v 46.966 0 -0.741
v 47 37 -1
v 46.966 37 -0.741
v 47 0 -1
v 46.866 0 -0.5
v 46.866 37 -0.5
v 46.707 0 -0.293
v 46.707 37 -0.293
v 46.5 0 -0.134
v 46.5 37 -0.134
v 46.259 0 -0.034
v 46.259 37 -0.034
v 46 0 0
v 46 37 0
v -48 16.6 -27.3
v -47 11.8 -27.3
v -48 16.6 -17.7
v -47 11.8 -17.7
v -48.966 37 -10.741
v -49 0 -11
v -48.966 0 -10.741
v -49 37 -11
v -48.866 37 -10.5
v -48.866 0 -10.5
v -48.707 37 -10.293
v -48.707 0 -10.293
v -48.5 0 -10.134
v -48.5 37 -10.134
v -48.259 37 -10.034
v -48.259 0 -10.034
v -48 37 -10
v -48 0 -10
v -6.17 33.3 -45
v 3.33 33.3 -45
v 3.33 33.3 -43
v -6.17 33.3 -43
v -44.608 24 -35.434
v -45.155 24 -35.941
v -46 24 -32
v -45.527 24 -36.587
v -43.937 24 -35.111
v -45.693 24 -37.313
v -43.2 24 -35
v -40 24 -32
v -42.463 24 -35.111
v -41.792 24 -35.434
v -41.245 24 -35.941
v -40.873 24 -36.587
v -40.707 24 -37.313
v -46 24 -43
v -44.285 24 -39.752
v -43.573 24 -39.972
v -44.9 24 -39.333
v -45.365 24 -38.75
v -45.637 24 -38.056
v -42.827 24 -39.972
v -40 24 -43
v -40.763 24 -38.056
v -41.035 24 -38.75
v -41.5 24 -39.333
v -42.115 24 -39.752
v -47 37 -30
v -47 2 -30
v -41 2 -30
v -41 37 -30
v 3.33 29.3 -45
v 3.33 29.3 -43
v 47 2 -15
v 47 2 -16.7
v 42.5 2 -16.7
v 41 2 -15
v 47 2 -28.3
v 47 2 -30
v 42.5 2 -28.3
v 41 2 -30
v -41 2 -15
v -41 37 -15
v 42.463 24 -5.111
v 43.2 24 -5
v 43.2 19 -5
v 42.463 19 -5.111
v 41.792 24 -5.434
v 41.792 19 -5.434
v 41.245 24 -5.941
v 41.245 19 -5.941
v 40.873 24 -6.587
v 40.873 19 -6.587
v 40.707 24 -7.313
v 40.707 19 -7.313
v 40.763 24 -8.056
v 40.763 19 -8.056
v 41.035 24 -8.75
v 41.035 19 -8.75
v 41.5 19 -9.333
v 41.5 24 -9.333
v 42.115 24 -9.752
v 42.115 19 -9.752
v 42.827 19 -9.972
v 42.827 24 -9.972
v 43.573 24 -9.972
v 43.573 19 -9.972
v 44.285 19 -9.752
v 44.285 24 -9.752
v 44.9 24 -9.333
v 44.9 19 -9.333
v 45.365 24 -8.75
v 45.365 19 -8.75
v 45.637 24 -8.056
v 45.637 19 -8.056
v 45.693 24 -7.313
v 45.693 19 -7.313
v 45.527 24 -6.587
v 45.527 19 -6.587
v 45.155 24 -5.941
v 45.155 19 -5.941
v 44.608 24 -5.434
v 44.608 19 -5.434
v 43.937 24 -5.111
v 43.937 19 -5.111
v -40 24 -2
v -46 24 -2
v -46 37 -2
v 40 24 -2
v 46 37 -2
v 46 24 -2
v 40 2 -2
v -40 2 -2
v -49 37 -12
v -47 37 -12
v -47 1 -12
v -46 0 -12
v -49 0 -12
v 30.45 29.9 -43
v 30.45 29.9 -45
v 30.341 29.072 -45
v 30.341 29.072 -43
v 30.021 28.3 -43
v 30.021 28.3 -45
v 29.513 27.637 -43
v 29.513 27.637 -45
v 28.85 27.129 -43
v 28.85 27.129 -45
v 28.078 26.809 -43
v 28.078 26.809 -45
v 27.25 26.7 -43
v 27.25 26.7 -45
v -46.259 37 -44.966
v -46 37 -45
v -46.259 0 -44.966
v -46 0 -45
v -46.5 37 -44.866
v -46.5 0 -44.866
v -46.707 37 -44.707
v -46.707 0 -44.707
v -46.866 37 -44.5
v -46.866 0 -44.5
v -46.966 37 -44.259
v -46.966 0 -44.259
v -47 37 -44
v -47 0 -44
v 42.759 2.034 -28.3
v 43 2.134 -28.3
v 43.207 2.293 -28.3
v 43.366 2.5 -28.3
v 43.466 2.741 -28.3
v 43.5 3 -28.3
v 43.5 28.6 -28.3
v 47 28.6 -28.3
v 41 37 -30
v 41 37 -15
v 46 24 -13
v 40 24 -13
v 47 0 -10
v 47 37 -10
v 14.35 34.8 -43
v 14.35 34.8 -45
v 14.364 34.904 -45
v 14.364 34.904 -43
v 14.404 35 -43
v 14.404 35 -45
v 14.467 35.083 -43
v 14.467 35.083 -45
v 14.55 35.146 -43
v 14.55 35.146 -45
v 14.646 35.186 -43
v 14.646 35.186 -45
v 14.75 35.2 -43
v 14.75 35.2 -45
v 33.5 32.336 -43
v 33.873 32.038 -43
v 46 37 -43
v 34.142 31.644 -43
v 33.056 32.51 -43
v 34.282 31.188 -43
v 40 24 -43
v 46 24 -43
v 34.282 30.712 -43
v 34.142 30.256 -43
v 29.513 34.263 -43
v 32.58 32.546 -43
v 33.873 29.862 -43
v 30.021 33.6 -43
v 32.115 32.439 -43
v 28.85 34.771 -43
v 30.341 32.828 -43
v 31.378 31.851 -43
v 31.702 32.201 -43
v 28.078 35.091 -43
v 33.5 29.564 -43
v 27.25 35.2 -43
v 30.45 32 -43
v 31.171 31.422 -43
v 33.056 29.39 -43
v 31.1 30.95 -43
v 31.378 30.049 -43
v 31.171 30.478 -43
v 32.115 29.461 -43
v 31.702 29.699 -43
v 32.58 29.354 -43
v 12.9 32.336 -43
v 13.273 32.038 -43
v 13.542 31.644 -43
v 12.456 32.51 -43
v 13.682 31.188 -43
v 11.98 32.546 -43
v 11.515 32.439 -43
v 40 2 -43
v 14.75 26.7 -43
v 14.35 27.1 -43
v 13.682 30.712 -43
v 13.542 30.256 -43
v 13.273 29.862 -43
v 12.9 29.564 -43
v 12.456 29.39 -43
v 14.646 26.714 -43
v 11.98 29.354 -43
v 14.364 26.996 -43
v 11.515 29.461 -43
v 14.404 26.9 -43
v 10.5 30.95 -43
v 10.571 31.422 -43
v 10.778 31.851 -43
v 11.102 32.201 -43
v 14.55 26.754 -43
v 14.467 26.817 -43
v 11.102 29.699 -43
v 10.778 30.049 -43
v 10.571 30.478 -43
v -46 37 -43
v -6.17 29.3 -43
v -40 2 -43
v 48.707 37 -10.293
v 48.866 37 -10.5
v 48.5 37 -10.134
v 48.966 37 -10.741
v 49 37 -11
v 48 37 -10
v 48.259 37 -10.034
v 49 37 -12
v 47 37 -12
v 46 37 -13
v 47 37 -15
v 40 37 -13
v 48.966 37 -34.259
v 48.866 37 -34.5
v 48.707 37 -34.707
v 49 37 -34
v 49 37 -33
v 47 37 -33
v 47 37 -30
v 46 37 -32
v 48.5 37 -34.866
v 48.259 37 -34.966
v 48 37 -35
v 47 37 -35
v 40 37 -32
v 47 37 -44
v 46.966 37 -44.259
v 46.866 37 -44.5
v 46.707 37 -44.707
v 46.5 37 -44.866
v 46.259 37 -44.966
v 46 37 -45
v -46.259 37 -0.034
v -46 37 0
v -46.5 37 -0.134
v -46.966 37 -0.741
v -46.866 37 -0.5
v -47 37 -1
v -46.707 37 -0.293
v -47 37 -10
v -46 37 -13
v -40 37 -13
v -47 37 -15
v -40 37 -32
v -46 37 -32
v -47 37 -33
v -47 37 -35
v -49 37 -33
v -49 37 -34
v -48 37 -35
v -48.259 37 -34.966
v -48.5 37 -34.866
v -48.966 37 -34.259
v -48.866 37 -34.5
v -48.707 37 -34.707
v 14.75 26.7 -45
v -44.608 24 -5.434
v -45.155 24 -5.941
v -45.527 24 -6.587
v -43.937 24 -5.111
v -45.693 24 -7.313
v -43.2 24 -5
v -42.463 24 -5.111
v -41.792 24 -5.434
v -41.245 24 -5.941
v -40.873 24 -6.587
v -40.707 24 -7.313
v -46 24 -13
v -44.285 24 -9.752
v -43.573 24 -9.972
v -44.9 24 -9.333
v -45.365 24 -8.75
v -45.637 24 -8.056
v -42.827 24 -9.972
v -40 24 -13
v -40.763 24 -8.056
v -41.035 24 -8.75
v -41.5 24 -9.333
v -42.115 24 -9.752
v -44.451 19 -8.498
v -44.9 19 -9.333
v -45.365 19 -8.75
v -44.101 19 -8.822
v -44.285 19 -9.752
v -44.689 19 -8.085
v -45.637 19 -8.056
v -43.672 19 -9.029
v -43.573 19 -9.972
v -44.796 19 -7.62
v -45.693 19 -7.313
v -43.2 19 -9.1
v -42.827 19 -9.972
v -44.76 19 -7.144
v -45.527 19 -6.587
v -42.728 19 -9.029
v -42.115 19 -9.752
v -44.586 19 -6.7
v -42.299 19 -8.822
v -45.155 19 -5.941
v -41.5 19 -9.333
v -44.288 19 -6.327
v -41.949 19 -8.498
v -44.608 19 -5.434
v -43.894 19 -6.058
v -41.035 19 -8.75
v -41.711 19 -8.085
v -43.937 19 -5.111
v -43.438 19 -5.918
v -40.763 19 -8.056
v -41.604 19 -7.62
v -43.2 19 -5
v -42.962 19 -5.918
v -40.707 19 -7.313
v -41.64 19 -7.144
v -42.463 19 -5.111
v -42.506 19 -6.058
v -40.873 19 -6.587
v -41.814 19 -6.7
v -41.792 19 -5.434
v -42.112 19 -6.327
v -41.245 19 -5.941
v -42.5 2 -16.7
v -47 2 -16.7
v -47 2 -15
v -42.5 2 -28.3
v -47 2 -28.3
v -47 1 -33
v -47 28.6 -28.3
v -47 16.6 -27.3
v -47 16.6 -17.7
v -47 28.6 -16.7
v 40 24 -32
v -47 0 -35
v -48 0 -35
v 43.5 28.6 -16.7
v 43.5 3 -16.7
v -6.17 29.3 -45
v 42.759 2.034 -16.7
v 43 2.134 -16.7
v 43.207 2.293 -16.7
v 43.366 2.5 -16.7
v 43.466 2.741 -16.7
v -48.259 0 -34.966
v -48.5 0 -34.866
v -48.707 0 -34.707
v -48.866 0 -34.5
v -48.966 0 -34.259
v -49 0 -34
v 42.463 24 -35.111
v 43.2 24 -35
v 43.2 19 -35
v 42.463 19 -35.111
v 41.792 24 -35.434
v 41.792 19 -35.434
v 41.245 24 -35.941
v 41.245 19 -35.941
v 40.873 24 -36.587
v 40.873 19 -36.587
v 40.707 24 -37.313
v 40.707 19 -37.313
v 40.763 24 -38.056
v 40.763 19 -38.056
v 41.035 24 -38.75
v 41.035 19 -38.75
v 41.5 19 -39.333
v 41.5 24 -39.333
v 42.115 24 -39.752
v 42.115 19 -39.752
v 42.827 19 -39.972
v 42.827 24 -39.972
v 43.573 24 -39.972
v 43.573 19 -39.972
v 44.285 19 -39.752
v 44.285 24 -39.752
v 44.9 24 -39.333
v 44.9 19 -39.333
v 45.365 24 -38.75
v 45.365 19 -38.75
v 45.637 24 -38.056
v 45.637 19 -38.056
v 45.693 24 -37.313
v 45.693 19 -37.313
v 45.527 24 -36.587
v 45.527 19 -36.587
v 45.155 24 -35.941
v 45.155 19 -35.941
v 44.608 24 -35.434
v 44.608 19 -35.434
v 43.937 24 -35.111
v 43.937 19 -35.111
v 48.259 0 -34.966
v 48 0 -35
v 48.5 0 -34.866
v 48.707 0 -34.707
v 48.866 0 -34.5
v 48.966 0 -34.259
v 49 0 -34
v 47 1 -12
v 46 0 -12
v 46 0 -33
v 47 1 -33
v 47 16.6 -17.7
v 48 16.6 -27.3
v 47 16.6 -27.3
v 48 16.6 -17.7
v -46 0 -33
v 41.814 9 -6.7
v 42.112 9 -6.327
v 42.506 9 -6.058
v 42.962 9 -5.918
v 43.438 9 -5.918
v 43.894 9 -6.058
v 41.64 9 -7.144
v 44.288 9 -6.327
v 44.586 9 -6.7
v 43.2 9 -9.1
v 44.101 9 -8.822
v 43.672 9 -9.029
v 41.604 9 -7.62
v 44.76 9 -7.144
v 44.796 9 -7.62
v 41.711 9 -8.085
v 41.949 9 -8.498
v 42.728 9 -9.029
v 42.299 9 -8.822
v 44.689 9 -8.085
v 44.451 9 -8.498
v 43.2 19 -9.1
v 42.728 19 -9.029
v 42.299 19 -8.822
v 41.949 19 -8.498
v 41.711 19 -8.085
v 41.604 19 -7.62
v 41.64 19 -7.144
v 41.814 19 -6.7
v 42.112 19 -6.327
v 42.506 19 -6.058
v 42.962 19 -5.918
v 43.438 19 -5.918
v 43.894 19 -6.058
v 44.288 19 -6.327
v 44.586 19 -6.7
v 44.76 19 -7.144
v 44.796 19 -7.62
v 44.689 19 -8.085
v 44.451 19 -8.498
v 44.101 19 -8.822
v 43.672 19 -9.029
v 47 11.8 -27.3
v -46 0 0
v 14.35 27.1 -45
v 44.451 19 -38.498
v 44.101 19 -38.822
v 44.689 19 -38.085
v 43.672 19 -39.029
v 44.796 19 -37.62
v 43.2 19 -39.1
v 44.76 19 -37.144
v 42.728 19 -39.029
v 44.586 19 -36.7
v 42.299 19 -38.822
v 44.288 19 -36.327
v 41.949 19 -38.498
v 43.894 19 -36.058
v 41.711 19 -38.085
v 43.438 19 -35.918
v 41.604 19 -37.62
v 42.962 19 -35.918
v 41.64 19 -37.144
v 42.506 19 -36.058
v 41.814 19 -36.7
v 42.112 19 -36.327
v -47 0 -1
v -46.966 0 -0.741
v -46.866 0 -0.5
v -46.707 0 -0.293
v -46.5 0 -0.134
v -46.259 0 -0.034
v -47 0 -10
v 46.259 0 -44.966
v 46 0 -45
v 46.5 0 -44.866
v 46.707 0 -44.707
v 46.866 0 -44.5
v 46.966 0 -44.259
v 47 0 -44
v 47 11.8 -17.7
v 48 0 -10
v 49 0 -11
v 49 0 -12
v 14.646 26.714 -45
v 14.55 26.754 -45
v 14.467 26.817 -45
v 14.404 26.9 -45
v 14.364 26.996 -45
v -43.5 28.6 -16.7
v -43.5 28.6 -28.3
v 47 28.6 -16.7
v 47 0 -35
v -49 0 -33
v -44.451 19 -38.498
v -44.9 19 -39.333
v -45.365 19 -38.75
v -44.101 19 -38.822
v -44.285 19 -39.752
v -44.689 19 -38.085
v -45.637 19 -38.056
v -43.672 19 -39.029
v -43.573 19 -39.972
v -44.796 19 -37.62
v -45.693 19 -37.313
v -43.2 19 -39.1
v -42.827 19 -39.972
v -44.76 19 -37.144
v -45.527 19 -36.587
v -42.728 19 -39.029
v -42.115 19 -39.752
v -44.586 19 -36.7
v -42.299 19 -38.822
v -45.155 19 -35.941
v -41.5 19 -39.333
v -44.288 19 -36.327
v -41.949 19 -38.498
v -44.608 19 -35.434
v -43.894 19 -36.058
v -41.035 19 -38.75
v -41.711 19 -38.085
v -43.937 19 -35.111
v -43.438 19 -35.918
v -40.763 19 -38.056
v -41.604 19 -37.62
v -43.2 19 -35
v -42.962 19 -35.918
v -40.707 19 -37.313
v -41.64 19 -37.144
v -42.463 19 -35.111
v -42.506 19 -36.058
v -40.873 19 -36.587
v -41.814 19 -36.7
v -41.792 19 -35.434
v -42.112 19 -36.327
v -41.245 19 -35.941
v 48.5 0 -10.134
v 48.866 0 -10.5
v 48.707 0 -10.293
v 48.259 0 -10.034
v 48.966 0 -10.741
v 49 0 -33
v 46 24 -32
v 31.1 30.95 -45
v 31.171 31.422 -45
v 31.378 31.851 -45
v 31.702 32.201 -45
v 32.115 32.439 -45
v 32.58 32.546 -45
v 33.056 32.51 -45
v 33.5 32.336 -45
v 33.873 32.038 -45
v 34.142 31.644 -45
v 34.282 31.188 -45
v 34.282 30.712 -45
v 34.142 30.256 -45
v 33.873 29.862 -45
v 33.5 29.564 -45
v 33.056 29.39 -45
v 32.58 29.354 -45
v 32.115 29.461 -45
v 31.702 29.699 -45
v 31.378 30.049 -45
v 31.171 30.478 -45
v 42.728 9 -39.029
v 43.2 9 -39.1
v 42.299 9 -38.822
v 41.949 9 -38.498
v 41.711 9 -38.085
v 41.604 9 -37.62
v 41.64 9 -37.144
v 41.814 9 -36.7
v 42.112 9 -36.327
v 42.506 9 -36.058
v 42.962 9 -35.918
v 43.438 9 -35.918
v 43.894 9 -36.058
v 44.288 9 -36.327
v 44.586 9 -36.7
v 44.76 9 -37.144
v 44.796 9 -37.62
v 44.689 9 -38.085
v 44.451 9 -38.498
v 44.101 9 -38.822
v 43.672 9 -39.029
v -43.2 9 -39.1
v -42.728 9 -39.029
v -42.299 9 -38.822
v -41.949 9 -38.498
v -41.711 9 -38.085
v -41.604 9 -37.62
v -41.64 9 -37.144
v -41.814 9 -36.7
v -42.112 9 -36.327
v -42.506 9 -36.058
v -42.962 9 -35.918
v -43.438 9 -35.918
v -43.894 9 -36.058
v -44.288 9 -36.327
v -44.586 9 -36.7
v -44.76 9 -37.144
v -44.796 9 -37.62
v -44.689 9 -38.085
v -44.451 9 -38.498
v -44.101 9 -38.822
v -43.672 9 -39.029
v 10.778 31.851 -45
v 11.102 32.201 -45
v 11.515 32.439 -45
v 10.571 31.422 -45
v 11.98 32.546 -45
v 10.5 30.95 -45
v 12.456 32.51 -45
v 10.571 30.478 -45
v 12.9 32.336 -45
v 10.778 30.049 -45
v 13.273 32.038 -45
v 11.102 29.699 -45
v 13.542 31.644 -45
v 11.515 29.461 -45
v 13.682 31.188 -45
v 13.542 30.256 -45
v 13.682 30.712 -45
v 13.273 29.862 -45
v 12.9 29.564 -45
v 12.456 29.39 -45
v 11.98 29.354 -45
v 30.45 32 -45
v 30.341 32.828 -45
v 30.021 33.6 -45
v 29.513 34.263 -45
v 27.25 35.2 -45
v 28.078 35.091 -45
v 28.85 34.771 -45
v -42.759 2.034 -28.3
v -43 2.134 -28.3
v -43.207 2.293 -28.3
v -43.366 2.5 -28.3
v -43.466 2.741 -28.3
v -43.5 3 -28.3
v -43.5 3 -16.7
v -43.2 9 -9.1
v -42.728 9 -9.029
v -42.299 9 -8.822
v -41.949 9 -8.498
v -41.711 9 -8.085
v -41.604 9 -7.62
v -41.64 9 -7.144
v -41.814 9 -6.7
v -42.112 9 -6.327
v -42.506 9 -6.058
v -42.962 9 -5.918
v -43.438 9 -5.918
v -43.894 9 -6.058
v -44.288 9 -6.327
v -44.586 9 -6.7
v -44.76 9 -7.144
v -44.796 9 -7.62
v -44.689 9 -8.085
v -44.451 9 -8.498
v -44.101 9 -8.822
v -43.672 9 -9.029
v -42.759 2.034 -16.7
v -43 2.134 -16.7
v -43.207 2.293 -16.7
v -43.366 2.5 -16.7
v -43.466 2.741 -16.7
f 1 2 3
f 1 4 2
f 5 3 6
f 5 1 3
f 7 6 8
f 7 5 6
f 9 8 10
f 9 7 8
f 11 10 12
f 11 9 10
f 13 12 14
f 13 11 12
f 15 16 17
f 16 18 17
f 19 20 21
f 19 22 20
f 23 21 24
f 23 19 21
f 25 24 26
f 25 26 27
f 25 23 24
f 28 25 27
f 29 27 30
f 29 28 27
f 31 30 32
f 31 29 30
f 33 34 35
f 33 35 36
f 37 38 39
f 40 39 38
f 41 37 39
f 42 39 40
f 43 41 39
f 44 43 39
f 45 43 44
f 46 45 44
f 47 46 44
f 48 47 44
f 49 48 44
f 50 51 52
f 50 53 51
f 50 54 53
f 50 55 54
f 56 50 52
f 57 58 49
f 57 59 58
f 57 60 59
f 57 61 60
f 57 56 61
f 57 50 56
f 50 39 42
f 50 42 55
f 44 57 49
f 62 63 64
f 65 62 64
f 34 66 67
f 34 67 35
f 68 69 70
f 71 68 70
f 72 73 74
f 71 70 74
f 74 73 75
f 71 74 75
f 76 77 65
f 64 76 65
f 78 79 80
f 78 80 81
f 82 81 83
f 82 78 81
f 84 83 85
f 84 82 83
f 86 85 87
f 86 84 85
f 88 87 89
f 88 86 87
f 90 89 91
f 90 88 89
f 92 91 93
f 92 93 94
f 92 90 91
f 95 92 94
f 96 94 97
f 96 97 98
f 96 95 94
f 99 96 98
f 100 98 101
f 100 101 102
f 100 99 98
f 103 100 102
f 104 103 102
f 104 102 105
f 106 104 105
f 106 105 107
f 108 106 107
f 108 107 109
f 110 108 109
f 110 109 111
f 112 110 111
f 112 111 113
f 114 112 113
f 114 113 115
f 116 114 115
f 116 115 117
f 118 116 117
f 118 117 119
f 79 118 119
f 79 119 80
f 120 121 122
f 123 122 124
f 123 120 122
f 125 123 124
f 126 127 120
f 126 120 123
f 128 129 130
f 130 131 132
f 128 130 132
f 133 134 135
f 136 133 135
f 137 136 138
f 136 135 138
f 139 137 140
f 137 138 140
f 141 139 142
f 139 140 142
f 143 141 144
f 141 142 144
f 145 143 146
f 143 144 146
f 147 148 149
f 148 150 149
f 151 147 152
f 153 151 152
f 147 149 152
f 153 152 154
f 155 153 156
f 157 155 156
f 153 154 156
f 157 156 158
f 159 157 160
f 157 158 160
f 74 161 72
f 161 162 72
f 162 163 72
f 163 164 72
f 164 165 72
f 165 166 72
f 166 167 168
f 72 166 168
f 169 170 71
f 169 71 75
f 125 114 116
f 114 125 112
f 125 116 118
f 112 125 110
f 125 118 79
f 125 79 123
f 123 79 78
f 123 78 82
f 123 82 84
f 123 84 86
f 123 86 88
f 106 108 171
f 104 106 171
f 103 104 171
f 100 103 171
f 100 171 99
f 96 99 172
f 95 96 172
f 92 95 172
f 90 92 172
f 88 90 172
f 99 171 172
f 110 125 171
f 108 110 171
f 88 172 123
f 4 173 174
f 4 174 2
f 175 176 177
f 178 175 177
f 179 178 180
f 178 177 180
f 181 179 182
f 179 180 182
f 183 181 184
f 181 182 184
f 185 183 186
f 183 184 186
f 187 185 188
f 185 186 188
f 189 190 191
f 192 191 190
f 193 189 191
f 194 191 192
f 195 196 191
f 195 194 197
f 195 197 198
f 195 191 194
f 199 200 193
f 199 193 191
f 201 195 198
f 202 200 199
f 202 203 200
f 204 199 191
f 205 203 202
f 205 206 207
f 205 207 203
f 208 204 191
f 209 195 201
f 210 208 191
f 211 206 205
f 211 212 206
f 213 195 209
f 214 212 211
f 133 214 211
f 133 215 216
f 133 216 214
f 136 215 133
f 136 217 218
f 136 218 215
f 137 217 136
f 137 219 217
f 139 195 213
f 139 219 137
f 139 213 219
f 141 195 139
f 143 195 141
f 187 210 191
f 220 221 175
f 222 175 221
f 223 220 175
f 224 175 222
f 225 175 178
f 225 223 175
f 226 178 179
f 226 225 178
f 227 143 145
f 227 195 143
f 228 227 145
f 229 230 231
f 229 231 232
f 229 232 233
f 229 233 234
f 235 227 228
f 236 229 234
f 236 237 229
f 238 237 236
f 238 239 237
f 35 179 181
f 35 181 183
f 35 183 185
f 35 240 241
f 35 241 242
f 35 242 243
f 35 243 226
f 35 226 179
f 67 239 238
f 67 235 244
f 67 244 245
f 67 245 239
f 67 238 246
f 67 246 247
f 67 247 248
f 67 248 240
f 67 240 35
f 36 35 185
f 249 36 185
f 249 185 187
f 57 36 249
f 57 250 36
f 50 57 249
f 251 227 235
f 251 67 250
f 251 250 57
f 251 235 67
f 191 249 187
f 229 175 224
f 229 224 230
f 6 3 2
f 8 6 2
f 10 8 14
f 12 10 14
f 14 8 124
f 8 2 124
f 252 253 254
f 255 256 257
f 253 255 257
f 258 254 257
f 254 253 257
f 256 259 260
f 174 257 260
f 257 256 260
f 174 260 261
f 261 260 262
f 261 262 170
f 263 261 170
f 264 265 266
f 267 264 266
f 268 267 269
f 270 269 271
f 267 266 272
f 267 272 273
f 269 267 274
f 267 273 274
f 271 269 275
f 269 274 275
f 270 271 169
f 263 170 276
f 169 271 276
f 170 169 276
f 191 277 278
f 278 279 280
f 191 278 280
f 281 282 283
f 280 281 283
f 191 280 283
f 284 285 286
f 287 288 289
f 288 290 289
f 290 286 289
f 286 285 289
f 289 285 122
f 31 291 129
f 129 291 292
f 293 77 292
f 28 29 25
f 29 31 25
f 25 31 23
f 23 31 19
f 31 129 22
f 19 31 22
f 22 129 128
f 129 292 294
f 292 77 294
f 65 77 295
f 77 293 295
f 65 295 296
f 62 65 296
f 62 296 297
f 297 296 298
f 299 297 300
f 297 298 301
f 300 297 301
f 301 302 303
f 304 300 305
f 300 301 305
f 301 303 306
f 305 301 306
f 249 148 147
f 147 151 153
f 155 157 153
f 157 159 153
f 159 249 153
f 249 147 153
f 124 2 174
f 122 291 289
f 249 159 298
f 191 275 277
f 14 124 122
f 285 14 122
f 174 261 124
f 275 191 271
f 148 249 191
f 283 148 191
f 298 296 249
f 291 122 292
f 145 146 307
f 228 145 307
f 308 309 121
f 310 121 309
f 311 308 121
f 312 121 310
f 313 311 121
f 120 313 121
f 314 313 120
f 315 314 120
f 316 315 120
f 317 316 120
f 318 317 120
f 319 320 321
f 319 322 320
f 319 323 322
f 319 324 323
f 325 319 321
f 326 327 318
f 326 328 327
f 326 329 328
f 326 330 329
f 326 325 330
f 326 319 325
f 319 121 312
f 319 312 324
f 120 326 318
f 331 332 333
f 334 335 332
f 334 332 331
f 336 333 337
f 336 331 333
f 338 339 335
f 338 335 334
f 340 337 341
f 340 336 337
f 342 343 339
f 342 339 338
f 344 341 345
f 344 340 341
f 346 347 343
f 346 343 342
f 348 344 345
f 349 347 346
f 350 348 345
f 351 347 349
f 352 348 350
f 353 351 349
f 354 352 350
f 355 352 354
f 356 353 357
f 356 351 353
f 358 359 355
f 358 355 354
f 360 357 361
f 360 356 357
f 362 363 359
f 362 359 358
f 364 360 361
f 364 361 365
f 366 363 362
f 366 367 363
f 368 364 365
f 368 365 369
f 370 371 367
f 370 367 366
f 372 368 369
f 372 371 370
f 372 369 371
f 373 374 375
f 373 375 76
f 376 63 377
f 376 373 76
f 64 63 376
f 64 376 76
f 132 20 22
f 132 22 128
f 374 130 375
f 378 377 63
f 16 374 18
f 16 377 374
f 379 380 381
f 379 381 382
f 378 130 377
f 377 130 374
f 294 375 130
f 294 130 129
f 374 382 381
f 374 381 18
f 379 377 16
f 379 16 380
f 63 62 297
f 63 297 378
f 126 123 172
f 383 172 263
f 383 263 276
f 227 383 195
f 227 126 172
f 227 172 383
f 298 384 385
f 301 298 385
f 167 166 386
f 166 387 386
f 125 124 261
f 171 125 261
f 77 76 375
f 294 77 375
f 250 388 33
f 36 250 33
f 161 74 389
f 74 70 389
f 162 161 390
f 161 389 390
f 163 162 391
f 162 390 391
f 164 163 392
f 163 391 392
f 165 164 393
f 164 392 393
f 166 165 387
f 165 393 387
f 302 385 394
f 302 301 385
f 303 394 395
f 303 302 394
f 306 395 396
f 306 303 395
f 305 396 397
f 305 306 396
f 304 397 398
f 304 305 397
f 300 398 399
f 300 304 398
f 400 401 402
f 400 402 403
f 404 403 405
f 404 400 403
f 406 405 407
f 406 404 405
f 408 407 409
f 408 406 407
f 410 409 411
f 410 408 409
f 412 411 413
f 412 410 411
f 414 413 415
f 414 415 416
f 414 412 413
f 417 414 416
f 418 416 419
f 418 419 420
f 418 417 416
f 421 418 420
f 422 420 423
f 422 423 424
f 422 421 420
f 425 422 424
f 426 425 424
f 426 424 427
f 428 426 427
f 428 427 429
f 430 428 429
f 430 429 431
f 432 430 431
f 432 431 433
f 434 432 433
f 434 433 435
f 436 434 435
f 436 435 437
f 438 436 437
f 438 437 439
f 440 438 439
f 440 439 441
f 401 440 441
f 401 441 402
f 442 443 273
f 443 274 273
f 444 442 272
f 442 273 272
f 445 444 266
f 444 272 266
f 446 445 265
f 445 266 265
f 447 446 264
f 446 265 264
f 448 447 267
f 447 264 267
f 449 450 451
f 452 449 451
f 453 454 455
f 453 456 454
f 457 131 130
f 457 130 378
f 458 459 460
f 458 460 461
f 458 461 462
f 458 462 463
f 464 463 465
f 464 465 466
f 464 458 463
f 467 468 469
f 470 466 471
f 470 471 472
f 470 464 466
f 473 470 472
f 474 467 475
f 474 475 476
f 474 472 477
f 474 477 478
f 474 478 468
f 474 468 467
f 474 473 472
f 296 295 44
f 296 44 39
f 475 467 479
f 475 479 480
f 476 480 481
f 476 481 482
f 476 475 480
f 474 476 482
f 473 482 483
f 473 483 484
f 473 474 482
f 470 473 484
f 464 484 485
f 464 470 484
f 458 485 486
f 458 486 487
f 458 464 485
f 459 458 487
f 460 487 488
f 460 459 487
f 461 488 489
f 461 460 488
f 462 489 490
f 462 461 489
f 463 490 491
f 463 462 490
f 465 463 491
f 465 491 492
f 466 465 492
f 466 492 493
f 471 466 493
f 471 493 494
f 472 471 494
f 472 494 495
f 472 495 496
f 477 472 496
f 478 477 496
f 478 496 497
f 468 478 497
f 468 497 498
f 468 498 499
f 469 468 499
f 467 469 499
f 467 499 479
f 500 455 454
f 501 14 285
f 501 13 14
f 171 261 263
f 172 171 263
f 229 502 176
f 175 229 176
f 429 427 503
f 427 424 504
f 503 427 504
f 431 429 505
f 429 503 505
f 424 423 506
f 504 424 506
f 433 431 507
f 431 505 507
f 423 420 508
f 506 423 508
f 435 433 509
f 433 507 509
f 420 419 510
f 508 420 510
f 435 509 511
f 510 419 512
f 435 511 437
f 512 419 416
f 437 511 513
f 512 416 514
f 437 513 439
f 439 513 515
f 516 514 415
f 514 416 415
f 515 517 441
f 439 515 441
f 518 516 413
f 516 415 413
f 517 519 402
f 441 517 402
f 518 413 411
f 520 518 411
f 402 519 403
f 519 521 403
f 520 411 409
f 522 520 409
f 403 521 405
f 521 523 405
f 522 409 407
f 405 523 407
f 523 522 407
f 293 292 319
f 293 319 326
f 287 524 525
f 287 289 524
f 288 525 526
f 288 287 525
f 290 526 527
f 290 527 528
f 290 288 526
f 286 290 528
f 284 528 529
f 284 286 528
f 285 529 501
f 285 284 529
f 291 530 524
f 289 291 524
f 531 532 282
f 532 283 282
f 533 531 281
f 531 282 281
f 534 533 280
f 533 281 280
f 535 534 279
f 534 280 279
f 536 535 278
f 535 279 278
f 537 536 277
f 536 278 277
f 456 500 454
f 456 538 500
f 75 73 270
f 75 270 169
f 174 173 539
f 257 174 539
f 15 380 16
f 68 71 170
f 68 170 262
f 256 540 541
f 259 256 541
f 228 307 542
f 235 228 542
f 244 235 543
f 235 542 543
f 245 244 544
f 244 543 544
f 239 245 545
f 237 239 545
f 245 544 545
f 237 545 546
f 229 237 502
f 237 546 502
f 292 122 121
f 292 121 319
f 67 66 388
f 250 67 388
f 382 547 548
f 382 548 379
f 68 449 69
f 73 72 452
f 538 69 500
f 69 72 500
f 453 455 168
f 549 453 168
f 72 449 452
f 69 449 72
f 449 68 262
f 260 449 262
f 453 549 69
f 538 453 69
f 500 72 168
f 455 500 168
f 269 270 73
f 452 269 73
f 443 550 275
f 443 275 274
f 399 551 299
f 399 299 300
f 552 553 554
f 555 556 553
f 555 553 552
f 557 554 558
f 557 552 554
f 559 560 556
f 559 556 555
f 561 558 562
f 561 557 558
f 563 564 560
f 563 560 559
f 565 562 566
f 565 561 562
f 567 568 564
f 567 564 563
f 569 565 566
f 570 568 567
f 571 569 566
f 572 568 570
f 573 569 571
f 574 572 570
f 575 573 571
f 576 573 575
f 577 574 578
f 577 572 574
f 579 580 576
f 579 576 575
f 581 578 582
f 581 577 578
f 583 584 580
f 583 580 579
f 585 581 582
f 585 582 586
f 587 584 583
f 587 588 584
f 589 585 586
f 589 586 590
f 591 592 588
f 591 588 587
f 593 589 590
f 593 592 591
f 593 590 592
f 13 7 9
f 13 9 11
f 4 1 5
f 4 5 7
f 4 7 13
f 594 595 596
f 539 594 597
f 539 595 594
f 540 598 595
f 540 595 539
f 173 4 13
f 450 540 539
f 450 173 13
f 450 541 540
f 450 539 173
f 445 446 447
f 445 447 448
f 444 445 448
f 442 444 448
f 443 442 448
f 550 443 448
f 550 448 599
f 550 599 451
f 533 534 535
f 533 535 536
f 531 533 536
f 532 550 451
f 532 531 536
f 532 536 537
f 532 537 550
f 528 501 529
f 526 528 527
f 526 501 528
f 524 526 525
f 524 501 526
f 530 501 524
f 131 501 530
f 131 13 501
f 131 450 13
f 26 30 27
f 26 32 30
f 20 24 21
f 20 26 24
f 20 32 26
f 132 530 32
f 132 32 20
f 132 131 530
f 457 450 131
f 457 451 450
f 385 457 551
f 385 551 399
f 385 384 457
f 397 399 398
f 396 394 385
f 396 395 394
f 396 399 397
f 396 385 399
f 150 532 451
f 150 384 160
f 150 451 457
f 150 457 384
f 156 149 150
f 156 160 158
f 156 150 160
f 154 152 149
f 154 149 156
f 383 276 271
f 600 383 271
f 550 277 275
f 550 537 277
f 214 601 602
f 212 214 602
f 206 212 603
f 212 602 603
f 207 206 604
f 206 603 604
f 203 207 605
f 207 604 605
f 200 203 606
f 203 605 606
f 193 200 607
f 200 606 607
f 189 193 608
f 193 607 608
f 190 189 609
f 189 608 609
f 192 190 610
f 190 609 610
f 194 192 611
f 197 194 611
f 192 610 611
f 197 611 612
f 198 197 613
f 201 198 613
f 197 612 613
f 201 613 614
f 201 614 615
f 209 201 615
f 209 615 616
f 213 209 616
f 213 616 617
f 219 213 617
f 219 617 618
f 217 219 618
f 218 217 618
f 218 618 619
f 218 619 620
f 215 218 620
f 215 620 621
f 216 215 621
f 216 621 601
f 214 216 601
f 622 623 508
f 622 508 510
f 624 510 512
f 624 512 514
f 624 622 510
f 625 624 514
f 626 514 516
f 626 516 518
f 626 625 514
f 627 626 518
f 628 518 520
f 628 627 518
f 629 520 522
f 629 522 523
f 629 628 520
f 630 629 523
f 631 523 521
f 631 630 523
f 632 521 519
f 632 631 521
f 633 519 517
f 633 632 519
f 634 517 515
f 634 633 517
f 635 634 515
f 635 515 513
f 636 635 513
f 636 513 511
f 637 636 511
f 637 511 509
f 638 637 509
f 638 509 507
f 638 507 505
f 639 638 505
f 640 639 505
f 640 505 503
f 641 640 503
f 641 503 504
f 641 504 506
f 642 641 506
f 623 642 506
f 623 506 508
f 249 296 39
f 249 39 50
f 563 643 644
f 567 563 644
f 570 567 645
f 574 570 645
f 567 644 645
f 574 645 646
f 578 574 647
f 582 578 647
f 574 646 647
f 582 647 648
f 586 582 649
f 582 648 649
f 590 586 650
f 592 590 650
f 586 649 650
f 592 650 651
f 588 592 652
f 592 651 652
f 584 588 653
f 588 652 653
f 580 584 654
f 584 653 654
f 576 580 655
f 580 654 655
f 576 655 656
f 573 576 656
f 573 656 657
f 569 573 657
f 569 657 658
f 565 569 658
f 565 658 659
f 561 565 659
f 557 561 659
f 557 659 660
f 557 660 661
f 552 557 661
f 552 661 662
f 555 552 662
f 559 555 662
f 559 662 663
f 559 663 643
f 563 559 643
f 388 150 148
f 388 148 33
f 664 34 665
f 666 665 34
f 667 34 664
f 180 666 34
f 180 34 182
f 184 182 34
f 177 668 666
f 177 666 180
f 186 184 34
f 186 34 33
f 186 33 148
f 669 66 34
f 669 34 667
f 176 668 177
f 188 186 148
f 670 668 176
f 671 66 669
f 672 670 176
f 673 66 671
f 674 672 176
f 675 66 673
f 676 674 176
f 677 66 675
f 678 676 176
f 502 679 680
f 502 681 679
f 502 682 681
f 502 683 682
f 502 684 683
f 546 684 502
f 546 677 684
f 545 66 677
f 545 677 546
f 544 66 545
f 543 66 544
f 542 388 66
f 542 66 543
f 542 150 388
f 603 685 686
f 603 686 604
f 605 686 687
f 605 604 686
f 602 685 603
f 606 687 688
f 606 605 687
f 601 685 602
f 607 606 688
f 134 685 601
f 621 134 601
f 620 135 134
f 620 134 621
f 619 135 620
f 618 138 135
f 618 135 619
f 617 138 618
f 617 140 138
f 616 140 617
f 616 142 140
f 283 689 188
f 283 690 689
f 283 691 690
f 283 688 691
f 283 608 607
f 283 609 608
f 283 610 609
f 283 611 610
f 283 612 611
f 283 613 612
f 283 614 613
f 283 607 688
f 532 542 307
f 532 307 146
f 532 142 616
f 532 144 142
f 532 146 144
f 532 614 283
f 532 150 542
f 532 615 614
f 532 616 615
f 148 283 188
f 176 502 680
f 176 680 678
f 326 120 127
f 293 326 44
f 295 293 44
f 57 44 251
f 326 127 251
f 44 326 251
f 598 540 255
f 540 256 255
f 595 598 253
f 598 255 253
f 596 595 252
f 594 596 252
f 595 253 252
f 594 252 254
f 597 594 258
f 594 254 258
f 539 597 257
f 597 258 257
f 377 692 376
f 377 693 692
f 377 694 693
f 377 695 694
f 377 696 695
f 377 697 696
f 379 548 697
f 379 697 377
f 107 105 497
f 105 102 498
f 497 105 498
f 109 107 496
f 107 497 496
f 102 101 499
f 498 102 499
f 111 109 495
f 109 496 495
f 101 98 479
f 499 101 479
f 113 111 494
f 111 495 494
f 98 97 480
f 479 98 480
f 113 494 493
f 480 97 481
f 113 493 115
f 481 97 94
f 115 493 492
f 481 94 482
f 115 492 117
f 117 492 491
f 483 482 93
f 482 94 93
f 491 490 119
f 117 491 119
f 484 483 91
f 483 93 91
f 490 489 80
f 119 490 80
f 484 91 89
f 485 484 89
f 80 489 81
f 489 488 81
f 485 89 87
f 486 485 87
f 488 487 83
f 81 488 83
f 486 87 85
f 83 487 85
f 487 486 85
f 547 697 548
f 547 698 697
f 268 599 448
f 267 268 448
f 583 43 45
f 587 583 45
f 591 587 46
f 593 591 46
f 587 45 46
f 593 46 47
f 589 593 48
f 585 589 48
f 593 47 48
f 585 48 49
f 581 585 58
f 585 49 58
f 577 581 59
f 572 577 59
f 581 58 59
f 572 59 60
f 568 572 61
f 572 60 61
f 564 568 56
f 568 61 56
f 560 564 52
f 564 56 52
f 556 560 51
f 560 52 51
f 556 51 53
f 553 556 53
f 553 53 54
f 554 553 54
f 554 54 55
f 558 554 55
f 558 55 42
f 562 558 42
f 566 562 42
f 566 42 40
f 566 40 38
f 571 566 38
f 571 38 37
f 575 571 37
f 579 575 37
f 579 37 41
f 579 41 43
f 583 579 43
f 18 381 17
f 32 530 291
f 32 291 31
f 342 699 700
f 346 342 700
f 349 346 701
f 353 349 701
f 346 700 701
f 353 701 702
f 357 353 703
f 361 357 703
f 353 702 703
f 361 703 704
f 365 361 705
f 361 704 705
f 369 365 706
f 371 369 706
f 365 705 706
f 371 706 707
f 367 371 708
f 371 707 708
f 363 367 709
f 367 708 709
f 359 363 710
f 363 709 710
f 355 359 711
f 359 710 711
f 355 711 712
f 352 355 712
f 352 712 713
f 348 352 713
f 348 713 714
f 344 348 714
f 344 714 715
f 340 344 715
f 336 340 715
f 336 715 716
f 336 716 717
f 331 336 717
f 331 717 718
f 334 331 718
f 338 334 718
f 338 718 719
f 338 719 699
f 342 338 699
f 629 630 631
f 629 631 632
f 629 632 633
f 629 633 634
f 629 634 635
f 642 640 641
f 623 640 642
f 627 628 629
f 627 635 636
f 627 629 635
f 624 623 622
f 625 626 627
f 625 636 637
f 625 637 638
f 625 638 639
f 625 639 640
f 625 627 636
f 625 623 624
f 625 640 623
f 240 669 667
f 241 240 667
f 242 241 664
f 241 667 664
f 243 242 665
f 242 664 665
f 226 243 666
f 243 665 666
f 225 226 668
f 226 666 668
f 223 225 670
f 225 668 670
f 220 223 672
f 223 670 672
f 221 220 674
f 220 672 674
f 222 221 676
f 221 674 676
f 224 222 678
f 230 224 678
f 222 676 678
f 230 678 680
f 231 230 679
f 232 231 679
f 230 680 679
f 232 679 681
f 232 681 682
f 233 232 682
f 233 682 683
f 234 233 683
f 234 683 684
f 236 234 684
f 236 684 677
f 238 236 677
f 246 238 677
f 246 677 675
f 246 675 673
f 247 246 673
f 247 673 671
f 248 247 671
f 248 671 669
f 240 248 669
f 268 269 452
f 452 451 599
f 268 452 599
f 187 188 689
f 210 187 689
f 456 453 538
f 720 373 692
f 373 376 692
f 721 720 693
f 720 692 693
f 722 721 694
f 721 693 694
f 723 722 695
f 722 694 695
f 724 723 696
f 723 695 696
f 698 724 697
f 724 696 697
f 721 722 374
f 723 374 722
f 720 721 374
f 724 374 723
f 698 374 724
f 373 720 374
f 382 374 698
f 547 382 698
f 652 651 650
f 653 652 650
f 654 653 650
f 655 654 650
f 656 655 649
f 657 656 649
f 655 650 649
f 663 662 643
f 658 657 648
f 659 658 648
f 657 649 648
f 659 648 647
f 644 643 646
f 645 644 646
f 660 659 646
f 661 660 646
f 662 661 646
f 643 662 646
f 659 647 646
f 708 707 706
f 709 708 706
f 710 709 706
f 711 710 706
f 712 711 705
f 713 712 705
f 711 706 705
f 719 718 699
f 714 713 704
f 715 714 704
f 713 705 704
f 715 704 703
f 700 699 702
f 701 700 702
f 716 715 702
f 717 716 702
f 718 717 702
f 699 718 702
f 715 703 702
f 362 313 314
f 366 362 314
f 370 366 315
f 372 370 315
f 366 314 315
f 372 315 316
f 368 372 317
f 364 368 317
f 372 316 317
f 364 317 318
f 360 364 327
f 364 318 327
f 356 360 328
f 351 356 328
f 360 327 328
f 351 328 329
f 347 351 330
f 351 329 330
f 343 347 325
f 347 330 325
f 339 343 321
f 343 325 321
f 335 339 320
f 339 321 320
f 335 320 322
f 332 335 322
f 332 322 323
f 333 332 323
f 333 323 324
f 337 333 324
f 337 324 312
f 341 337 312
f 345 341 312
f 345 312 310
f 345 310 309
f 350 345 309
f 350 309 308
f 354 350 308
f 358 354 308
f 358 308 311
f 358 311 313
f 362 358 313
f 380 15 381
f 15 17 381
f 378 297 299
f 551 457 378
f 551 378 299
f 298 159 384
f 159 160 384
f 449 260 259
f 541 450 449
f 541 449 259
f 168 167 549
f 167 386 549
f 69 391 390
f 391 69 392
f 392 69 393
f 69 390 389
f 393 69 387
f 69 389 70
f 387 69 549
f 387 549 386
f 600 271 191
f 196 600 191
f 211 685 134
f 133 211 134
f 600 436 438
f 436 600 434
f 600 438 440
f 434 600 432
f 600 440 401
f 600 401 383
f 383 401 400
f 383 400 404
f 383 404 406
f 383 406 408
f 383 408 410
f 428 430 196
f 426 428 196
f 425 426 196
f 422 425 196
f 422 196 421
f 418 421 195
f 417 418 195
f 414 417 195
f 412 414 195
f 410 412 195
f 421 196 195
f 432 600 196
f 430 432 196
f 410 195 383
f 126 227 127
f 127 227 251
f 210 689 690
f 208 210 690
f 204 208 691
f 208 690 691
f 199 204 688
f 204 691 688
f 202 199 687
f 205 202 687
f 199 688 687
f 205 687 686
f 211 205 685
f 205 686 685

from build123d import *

# Parameters (mm, degrees)
SKETCH1_W            = 47
SKETCH1_H            = 45
BOSS_EXTRUDE1_DEPTH  = 2
BOSS_EXTRUDE3_DEPTH  = 35
BOSS_EXTRUDE4_DEPTH  = 4.8
SKETCH6_W            = 2
SKETCH6_H            = 2
BOSS_EXTRUDE5_DEPTH  = 37
SKETCH13_W           = 6
SKETCH13_H           = 11
BOSS_EXTRUDE7_DEPTH  = 22
SKETCH23_W           = 3.5
SKETCH23_H           = 26.6
BOSS_EXTRUDE9_DEPTH  = 1
SKETCH24_W           = 3.5
SKETCH24_H           = 26.6
BOSS_EXTRUDE10_DEPTH = 1
HOLE2_D              = 3.2
HOLE2_DEPTH          = 15
HOLE2_CBORE_D        = 5
HOLE2_CBORE_DEPTH    = 5
FILLET1_R            = 1
FILLET2_R            = 1
SKETCH25_W           = 1
SKETCH25_H           = 15
CUT_EXTRUDE5_DEPTH   = 35
FILLET1_OF_MIRROR1_R = 1
FILLET2_OF_MIRROR1_R = 1
CHAMFER1_SIZE        = 1
SKETCH19_R           = 1.6
CUT_EXTRUDE1_DEPTH   = 10
SKETCH20_W           = 9.5
SKETCH20_H           = 4
CUT_EXTRUDE2_DEPTH   = 10


with BuildPart() as part:
    # Sketch1 → Boss-Extrude1 (new body)
    with BuildSketch(Plane(origin=(0, 0, 0), x_dir=(1, 0, 0), z_dir=(0, 1, 0))):
        with Locations((-23.5, 22.5)):
            Rectangle(SKETCH1_W, SKETCH1_H)
    boss_extrude1 = extrude(amount=BOSS_EXTRUDE1_DEPTH)

    # Sketch4 → Boss-Extrude3 (add)
    with BuildSketch(Plane(origin=(0, 2, 0), x_dir=(1, 0, 0), z_dir=(0, 1, 0))):
        Polygon((-42, 15), (-47, 15), (-47, 0), (0, 0), (0, 2), (-0.864229009, 2), (-2, 2), (-45, 2), (-46, 2), (-46, 13), (-45, 13), (-40, 13), (-40, 32), (-45, 32), (-46, 32), (-46, 43), (-45, 43), (-2, 43), (0, 43), (0, 45), (-47, 45), (-47, 30), (-42, 30), align=None)
    boss_extrude3 = extrude(amount=BOSS_EXTRUDE3_DEPTH)

    # Sketch5 → Boss-Extrude4 (add, symmetric)
    with BuildSketch(Plane.XY.offset(-22.5)):
        Polygon((-47, 2), (-47, 11.8), (-48, 16.6), (-47, 16.6), (-47, 28.6), (-43.5, 28.6), (-43.5, 2), align=None)
    boss_extrude4 = extrude(amount=BOSS_EXTRUDE4_DEPTH, both=True)

    # Sketch6 → Boss-Extrude5 (add)
    with BuildSketch(Plane(origin=(0, 0, 0), x_dir=(-1, 0, 0), z_dir=(0, -1, 0))):
        with Locations((48, 34)):
            Rectangle(SKETCH6_W, SKETCH6_H)
        with Locations((48, 11)):
            Rectangle(SKETCH6_W, SKETCH6_H)
    boss_extrude5 = extrude(amount=-BOSS_EXTRUDE5_DEPTH)

    # Sketch13 → Boss-Extrude7 (add)
    with BuildSketch(Plane(origin=(0, 2, 0), x_dir=(1, 0, 0), z_dir=(0, 1, 0))):
        with Locations((-43, 37.5)):
            Rectangle(SKETCH13_W, SKETCH13_H)
        with Locations((-43, 7.5)):
            Rectangle(SKETCH13_W, SKETCH13_H)
    boss_extrude7 = extrude(amount=BOSS_EXTRUDE7_DEPTH)

    # Sketch23 → Boss-Extrude9 (add)
    with BuildSketch(Plane.XY.offset(-17.7)):
        with Locations((-45.25, 15.3)):
            Rectangle(SKETCH23_W, SKETCH23_H)
    boss_extrude9 = extrude(amount=BOSS_EXTRUDE9_DEPTH)

    # Sketch24 → Boss-Extrude10 (add)
    with BuildSketch(Plane(origin=(0, 0, -27.3), x_dir=(-1, 0, 0), z_dir=(0, 0, -1))):
        with Locations((45.25, 15.3)):
            Rectangle(SKETCH24_W, SKETCH24_H)
    boss_extrude10 = extrude(amount=BOSS_EXTRUDE10_DEPTH)

    # Hole2
    with Locations(Plane(origin=(-43.2, 24, -7.5), x_dir=(0, 0, 1), z_dir=(0, 1, 0))):
        with Locations((0, 0), (-30, 0)):
            hole2 = CounterBoreHole(HOLE2_D / 2, HOLE2_CBORE_D / 2, HOLE2_CBORE_DEPTH, depth=HOLE2_DEPTH)

    # Fillet1
    fillet1_edges = [part.edges().sort_by_distance(p)[0] for p in [
        (-47, 18.5, 0),
        (-47, 18.5, -45),
        (-49, 18.5, -35),
        (-49, 18.5, -10),
    ]]
    fillet(fillet1_edges, radius=FILLET1_R)

    # Fillet2
    fillet2_edges = [part.edges().sort_by_distance(p)[0] for p in [
        (-43.5, 2, -22.5),
    ]]
    fillet(fillet2_edges, radius=FILLET2_R)

    # Sketch25 → Cut-Extrude5 (cut)
    with BuildSketch(Plane(origin=(0, 37, 0), x_dir=(1, 0, 0), z_dir=(0, 1, 0))):
        with Locations((-41.5, 22.5)):
            Rectangle(SKETCH25_W, SKETCH25_H)
    cut_extrude5 = extrude(amount=-CUT_EXTRUDE5_DEPTH, mode=Mode.SUBTRACT)

    # Mirror1: Boss-Extrude1, Boss-Extrude3, Boss-Extrude4, Boss-Extrude5, Boss-Extrude7, Boss-Extrude9, Boss-Extrude10, Hole2, Cut-Extrude5 across plane
    add(boss_extrude1.mirror(Plane(origin=(0, 0, 0), x_dir=(0, 0, 1), z_dir=(1, 0, 0))))
    add(boss_extrude3.mirror(Plane(origin=(0, 0, 0), x_dir=(0, 0, 1), z_dir=(1, 0, 0))))
    add(boss_extrude4.mirror(Plane(origin=(0, 0, 0), x_dir=(0, 0, 1), z_dir=(1, 0, 0))))
    add(boss_extrude5.mirror(Plane(origin=(0, 0, 0), x_dir=(0, 0, 1), z_dir=(1, 0, 0))))
    add(boss_extrude7.mirror(Plane(origin=(0, 0, 0), x_dir=(0, 0, 1), z_dir=(1, 0, 0))))
    add(boss_extrude9.mirror(Plane(origin=(0, 0, 0), x_dir=(0, 0, 1), z_dir=(1, 0, 0))))
    add(boss_extrude10.mirror(Plane(origin=(0, 0, 0), x_dir=(0, 0, 1), z_dir=(1, 0, 0))))
    add(hole2.mirror(Plane(origin=(0, 0, 0), x_dir=(0, 0, 1), z_dir=(1, 0, 0))), mode=Mode.SUBTRACT)
    add(cut_extrude5.mirror(Plane(origin=(0, 0, 0), x_dir=(0, 0, 1), z_dir=(1, 0, 0))), mode=Mode.SUBTRACT)

    # Fillet1 of Mirror1
    fillet1_of_mirror1_edges = [part.edges().sort_by_distance(p)[0] for p in [
        (47, 18.5, 0),
        (47, 18.5, -45),
        (49, 18.5, -35),
        (49, 18.5, -10),
    ]]
    fillet(fillet1_of_mirror1_edges, radius=FILLET1_OF_MIRROR1_R)

    # Fillet2 of Mirror1
    fillet2_of_mirror1_edges = [part.edges().sort_by_distance(p)[0] for p in [
        (43.5, 2, -22.5),
    ]]
    fillet(fillet2_of_mirror1_edges, radius=FILLET2_OF_MIRROR1_R)

    # Chamfer1
    chamfer1_edges = [part.edges().sort_by_distance(p)[0] for p in [
        (47, 0, -22.5),
        (-47, 0, -22.5),
    ]]
    chamfer(chamfer1_edges, length=CHAMFER1_SIZE)

    # Sketch19 → Cut-Extrude1 (cut)
    with BuildSketch(Plane(origin=(-58.916405474, -6.932652766, -45), x_dir=(-1, 0, 0), z_dir=(0, 0, -1))):
        with Locations((-91.616405474, 37.882652766)):
            Circle(SKETCH19_R)
        with Locations((-71.016405474, 37.882652766)):
            Circle(SKETCH19_R)
        with BuildLine():
            Line((-73.666405474, 42.132652766), (-86.166405474, 42.132652766))
            ThreePointArc((-86.166405474, 42.132652766), (-88.429147174, 41.195394466), (-89.366405474, 38.932652766))
            Line((-89.366405474, 38.932652766), (-89.366405474, 36.832652766))
            ThreePointArc((-89.366405474, 36.832652766), (-88.429147174, 34.569911067), (-86.166405474, 33.632652766))
            Line((-86.166405474, 33.632652766), (-73.666405474, 33.632652766))
            ThreePointArc((-73.666405474, 33.632652766), (-73.383562762, 33.749810054), (-73.266405474, 34.032652766))
            Line((-73.266405474, 34.032652766), (-73.266405474, 41.732652766))
            ThreePointArc((-73.266405474, 41.732652766), (-73.383562762, 42.015495479), (-73.666405474, 42.132652766))
        make_face()
    extrude(amount=-CUT_EXTRUDE1_DEPTH, mode=Mode.SUBTRACT)

    # Sketch20 → Cut-Extrude2 (cut)
    with BuildSketch(Plane(origin=(-58.916405474, -6.932652766, -45), x_dir=(-1, 0, 0), z_dir=(0, 0, -1))):
        with Locations((-57.496405474, 38.232652766)):
            Rectangle(SKETCH20_W, SKETCH20_H)
    extrude(amount=-CUT_EXTRUDE2_DEPTH, mode=Mode.SUBTRACT)


solid = part.part
